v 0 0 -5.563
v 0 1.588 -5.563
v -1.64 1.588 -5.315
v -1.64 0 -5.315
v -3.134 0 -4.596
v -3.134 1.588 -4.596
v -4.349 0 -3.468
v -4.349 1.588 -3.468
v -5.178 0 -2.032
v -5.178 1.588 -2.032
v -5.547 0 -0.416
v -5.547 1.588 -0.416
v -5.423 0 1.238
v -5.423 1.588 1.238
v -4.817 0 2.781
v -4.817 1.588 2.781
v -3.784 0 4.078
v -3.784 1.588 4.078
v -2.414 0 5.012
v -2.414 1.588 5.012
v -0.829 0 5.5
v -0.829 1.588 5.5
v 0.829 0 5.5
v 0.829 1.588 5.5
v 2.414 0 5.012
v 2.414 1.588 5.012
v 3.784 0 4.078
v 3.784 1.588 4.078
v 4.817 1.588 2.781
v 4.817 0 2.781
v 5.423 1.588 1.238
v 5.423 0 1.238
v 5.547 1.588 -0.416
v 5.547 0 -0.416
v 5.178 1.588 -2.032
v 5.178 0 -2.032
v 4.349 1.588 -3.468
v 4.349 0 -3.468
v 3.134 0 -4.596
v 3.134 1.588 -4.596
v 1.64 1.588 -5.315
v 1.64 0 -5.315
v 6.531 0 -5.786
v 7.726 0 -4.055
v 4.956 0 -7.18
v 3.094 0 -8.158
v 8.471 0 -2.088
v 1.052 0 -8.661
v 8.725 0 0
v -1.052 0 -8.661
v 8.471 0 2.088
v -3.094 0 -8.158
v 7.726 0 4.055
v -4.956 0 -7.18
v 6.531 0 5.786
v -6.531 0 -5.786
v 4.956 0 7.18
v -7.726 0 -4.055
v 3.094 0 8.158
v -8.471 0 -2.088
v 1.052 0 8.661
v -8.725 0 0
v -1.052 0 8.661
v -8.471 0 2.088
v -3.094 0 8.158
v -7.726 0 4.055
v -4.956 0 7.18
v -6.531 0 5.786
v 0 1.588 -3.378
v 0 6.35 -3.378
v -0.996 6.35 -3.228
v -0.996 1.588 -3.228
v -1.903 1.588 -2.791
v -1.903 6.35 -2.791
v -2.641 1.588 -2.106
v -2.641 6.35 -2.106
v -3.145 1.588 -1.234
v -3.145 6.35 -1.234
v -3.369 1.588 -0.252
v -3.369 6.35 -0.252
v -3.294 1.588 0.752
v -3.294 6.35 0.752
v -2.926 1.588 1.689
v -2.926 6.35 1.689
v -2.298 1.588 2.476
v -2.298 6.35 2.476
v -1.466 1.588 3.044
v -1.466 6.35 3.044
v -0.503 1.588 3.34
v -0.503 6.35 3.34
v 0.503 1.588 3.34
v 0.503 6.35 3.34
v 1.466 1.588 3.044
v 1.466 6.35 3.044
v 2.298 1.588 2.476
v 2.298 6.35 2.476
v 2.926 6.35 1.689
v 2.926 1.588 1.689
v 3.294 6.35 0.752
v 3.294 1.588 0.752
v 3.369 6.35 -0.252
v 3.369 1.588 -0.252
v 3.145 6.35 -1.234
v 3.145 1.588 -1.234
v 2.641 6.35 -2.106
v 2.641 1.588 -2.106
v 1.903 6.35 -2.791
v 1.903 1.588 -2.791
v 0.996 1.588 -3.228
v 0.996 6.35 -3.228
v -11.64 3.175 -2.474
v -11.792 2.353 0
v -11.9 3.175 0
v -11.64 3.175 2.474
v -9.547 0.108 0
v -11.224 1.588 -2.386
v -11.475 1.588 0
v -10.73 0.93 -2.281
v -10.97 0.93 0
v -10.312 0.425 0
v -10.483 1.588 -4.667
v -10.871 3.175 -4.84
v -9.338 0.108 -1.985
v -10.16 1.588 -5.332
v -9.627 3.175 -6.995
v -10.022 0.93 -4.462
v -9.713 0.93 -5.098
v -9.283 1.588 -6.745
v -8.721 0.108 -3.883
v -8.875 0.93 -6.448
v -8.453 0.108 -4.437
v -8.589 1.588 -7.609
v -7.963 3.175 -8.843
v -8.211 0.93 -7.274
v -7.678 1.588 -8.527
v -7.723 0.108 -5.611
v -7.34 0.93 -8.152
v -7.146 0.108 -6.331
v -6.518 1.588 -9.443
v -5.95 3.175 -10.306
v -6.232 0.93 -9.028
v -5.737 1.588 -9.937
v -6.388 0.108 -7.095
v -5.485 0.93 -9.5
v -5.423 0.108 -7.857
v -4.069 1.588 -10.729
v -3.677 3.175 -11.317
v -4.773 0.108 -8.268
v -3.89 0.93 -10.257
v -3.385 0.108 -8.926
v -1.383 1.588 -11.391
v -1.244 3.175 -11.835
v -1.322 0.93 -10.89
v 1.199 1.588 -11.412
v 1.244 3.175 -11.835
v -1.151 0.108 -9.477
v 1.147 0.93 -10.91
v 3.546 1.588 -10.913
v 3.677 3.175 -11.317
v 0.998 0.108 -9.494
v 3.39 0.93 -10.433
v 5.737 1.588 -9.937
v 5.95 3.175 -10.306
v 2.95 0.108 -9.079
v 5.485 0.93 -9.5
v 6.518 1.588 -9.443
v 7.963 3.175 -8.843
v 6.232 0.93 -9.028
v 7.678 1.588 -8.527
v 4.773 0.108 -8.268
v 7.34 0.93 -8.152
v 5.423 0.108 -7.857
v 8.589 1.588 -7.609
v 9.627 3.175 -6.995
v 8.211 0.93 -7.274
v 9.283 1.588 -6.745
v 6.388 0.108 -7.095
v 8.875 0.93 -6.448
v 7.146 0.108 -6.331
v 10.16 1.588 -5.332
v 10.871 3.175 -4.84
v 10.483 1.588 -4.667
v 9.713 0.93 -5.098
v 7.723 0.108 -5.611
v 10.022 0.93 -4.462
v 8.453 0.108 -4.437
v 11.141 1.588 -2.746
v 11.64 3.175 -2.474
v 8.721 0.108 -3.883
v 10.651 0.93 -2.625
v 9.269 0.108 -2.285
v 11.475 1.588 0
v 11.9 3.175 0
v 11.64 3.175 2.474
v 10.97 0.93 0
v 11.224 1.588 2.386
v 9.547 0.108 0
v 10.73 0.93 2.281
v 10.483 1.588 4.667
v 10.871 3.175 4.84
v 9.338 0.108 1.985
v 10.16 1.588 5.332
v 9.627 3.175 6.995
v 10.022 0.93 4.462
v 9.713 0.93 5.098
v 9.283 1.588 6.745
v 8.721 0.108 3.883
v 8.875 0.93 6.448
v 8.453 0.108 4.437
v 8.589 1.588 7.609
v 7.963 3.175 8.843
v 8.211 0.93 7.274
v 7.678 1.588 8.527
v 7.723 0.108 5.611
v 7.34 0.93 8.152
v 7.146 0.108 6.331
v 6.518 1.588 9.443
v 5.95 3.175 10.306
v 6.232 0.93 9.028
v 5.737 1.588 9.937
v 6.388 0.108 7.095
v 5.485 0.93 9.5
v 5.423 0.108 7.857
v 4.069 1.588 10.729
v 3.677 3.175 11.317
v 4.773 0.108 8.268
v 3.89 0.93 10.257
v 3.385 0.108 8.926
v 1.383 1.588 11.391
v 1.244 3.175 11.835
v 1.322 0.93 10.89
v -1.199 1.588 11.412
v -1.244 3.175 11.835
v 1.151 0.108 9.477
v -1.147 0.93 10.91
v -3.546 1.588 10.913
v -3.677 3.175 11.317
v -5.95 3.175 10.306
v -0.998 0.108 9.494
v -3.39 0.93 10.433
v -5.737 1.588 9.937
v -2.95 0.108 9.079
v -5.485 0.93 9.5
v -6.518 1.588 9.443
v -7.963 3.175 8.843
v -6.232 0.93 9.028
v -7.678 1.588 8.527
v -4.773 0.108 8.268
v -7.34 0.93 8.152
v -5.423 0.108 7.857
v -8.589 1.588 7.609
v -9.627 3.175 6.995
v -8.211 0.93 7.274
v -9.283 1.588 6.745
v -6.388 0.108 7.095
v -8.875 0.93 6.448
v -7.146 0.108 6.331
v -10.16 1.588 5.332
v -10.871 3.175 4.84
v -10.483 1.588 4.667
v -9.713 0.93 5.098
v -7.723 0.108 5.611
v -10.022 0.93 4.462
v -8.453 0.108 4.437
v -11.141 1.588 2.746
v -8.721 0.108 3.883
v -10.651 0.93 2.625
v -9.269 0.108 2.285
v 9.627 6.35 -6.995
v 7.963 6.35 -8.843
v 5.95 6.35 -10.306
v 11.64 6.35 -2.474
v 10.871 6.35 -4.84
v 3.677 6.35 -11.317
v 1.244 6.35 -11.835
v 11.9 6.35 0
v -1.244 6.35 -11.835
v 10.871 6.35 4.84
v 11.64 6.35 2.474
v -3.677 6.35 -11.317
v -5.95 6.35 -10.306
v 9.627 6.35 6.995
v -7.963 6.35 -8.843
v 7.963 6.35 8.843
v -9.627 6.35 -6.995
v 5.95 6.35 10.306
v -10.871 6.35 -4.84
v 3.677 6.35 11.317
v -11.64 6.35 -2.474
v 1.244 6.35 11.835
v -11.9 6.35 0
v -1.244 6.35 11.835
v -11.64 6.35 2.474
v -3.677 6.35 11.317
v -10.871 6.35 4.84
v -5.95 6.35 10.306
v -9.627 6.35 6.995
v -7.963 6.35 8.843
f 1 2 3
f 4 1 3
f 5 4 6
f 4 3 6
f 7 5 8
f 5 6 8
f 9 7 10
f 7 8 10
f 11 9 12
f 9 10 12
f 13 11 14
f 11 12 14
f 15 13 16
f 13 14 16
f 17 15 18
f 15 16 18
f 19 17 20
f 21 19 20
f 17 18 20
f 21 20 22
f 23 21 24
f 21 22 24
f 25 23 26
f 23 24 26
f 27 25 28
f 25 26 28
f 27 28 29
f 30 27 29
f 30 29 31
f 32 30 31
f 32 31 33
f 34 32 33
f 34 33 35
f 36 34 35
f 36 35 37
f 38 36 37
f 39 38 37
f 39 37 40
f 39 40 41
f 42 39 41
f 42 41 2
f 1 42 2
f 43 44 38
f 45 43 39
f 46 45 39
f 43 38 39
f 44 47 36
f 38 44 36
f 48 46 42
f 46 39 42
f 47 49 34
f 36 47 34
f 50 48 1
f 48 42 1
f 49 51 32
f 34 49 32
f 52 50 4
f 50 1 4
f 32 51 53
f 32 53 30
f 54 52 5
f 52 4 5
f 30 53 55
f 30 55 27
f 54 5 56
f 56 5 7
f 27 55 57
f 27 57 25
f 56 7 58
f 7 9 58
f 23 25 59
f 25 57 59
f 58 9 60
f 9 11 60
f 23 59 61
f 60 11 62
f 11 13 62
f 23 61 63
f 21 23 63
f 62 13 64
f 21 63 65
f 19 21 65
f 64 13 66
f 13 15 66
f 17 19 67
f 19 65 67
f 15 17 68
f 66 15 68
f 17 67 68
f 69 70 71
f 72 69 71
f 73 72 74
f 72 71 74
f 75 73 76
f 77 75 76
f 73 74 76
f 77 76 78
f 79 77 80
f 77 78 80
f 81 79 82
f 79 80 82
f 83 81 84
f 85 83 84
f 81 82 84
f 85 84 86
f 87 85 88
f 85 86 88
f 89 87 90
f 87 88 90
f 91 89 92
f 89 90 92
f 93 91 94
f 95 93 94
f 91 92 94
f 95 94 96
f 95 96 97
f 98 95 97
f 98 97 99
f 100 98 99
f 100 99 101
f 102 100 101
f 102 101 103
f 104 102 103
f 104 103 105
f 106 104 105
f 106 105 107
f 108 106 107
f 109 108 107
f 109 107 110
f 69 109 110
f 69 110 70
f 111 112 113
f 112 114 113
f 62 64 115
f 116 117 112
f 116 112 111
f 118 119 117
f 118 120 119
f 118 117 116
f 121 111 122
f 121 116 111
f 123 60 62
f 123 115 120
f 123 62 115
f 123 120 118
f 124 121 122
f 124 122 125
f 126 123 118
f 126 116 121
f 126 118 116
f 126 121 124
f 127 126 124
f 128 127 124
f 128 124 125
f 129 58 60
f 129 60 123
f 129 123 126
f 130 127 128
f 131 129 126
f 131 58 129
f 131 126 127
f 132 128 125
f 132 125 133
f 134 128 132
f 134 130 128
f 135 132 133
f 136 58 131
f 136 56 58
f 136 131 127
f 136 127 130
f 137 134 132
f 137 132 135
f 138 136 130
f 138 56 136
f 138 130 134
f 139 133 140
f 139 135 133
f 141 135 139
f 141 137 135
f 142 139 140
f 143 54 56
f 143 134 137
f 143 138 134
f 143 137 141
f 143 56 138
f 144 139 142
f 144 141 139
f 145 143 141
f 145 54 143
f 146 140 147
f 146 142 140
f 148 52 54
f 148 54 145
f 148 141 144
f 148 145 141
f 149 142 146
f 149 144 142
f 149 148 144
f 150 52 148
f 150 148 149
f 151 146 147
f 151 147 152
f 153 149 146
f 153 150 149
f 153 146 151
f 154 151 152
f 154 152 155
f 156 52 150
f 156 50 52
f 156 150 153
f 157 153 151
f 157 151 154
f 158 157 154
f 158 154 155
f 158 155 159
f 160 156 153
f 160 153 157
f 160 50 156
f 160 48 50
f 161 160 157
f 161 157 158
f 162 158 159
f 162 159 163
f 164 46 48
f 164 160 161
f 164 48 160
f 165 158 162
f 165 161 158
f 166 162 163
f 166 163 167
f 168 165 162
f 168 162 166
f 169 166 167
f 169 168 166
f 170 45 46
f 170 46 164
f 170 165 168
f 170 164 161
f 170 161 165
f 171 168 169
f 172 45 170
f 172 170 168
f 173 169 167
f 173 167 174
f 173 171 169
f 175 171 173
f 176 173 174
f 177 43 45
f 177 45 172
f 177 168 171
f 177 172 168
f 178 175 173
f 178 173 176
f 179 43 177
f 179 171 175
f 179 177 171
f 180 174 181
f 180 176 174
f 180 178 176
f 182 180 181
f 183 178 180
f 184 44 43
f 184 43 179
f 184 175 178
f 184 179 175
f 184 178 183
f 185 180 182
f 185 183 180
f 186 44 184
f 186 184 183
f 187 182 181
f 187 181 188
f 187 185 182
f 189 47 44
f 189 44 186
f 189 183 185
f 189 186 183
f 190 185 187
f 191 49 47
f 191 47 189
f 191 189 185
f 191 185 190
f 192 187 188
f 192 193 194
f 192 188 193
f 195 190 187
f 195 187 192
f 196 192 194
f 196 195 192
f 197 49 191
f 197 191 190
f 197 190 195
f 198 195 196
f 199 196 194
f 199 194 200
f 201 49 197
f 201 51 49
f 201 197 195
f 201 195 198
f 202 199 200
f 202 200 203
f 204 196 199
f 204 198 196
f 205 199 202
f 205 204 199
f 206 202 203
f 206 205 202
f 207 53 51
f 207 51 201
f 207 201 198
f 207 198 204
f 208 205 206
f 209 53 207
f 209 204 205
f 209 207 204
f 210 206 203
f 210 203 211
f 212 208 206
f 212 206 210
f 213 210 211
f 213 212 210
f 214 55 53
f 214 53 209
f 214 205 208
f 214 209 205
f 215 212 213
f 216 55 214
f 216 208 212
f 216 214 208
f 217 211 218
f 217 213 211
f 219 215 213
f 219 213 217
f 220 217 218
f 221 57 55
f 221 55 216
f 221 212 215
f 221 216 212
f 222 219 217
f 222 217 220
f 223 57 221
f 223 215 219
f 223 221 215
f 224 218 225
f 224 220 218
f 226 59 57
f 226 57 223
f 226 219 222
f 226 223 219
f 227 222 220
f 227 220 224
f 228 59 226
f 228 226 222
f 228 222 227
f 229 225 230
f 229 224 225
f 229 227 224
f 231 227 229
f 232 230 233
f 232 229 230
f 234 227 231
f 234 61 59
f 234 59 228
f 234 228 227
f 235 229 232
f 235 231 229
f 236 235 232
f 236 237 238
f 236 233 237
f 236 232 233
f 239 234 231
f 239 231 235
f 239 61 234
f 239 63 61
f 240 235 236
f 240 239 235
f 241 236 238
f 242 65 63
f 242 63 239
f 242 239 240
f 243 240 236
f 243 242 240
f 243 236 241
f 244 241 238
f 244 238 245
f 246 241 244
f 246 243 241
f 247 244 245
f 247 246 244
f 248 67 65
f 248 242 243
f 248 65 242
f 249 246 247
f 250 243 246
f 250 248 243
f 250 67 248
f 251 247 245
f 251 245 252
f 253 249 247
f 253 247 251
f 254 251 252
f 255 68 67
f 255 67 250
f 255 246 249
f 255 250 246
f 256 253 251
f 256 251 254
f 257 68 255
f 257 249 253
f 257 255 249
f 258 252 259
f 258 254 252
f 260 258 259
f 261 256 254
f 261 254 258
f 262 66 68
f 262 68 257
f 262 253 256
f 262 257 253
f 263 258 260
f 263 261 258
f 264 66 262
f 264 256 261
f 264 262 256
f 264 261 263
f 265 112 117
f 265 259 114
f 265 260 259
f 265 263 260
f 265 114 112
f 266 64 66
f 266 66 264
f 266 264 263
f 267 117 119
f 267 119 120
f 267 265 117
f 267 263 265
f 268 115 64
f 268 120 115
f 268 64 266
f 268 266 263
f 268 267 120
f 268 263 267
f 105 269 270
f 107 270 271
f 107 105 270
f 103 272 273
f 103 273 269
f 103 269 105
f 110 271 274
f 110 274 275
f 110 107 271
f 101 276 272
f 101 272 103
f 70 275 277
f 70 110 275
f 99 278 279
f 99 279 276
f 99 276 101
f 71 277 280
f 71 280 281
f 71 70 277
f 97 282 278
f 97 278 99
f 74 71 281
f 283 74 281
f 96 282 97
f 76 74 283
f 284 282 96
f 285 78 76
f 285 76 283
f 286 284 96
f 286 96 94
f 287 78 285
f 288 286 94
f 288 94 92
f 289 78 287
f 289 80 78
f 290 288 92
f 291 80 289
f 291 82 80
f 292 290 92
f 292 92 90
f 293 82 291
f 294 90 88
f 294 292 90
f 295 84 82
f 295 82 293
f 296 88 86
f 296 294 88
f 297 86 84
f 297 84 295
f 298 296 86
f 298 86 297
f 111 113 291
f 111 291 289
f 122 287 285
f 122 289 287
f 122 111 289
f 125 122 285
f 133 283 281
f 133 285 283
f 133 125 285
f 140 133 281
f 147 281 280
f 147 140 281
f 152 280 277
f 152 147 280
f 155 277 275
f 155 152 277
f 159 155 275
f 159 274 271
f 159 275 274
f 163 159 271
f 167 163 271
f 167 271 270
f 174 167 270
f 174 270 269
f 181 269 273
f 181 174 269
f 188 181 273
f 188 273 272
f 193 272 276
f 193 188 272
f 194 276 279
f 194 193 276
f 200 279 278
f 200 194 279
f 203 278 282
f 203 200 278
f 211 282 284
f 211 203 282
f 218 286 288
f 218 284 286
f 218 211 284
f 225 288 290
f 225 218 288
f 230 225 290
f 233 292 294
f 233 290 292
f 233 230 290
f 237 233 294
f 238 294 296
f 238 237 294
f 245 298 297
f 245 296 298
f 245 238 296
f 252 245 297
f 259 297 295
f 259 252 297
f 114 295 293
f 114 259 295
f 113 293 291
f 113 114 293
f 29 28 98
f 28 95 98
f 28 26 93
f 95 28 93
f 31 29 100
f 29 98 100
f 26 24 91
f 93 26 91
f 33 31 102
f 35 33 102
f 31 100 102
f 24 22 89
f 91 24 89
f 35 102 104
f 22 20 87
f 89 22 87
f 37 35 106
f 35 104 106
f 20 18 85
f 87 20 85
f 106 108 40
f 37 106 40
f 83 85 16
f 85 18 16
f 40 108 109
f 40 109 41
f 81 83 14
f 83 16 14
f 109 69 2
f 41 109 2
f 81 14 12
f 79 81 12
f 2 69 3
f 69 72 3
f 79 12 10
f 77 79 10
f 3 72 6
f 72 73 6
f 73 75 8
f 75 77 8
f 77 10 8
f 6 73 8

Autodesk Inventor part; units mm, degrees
ref_plane "YZ Plane" through (0, 0, 0) normal (1, 0, 0) x (0, 1, 0)
ref_plane "XZ Plane" through (0, 0, 0) normal (0, 1, 0) x (-1, 0, 0)
ref_plane "XY Plane" through (0, 0, 0) normal (0, 0, 1) x (1, 0, 0)
sketch "Sketch1" plane through (0, 0, 0) normal (0, 1, 0) x (-1, 0, 0)
  circle A0 centre (0, 0) radius 11.8999
  dimension "d0" = 23.7998
extrude "Extrusion1" add sketch "Sketch1" along normal blind 6.35
hole "Hole1" at (0, 0, 0) direction (0, 1, 0) diameter 6.7564 end through all counterbore diameter 11.1252 counterbore depth 1.5875 clearance for "Socket Head Cap Screw" size "1/4" standard "Ansi Unified Screw Threads"
fillet "Fillet1" radius 3.175 1 edges at (11.8999, 0, 0)
properties part number "RoundRetainingClip"
